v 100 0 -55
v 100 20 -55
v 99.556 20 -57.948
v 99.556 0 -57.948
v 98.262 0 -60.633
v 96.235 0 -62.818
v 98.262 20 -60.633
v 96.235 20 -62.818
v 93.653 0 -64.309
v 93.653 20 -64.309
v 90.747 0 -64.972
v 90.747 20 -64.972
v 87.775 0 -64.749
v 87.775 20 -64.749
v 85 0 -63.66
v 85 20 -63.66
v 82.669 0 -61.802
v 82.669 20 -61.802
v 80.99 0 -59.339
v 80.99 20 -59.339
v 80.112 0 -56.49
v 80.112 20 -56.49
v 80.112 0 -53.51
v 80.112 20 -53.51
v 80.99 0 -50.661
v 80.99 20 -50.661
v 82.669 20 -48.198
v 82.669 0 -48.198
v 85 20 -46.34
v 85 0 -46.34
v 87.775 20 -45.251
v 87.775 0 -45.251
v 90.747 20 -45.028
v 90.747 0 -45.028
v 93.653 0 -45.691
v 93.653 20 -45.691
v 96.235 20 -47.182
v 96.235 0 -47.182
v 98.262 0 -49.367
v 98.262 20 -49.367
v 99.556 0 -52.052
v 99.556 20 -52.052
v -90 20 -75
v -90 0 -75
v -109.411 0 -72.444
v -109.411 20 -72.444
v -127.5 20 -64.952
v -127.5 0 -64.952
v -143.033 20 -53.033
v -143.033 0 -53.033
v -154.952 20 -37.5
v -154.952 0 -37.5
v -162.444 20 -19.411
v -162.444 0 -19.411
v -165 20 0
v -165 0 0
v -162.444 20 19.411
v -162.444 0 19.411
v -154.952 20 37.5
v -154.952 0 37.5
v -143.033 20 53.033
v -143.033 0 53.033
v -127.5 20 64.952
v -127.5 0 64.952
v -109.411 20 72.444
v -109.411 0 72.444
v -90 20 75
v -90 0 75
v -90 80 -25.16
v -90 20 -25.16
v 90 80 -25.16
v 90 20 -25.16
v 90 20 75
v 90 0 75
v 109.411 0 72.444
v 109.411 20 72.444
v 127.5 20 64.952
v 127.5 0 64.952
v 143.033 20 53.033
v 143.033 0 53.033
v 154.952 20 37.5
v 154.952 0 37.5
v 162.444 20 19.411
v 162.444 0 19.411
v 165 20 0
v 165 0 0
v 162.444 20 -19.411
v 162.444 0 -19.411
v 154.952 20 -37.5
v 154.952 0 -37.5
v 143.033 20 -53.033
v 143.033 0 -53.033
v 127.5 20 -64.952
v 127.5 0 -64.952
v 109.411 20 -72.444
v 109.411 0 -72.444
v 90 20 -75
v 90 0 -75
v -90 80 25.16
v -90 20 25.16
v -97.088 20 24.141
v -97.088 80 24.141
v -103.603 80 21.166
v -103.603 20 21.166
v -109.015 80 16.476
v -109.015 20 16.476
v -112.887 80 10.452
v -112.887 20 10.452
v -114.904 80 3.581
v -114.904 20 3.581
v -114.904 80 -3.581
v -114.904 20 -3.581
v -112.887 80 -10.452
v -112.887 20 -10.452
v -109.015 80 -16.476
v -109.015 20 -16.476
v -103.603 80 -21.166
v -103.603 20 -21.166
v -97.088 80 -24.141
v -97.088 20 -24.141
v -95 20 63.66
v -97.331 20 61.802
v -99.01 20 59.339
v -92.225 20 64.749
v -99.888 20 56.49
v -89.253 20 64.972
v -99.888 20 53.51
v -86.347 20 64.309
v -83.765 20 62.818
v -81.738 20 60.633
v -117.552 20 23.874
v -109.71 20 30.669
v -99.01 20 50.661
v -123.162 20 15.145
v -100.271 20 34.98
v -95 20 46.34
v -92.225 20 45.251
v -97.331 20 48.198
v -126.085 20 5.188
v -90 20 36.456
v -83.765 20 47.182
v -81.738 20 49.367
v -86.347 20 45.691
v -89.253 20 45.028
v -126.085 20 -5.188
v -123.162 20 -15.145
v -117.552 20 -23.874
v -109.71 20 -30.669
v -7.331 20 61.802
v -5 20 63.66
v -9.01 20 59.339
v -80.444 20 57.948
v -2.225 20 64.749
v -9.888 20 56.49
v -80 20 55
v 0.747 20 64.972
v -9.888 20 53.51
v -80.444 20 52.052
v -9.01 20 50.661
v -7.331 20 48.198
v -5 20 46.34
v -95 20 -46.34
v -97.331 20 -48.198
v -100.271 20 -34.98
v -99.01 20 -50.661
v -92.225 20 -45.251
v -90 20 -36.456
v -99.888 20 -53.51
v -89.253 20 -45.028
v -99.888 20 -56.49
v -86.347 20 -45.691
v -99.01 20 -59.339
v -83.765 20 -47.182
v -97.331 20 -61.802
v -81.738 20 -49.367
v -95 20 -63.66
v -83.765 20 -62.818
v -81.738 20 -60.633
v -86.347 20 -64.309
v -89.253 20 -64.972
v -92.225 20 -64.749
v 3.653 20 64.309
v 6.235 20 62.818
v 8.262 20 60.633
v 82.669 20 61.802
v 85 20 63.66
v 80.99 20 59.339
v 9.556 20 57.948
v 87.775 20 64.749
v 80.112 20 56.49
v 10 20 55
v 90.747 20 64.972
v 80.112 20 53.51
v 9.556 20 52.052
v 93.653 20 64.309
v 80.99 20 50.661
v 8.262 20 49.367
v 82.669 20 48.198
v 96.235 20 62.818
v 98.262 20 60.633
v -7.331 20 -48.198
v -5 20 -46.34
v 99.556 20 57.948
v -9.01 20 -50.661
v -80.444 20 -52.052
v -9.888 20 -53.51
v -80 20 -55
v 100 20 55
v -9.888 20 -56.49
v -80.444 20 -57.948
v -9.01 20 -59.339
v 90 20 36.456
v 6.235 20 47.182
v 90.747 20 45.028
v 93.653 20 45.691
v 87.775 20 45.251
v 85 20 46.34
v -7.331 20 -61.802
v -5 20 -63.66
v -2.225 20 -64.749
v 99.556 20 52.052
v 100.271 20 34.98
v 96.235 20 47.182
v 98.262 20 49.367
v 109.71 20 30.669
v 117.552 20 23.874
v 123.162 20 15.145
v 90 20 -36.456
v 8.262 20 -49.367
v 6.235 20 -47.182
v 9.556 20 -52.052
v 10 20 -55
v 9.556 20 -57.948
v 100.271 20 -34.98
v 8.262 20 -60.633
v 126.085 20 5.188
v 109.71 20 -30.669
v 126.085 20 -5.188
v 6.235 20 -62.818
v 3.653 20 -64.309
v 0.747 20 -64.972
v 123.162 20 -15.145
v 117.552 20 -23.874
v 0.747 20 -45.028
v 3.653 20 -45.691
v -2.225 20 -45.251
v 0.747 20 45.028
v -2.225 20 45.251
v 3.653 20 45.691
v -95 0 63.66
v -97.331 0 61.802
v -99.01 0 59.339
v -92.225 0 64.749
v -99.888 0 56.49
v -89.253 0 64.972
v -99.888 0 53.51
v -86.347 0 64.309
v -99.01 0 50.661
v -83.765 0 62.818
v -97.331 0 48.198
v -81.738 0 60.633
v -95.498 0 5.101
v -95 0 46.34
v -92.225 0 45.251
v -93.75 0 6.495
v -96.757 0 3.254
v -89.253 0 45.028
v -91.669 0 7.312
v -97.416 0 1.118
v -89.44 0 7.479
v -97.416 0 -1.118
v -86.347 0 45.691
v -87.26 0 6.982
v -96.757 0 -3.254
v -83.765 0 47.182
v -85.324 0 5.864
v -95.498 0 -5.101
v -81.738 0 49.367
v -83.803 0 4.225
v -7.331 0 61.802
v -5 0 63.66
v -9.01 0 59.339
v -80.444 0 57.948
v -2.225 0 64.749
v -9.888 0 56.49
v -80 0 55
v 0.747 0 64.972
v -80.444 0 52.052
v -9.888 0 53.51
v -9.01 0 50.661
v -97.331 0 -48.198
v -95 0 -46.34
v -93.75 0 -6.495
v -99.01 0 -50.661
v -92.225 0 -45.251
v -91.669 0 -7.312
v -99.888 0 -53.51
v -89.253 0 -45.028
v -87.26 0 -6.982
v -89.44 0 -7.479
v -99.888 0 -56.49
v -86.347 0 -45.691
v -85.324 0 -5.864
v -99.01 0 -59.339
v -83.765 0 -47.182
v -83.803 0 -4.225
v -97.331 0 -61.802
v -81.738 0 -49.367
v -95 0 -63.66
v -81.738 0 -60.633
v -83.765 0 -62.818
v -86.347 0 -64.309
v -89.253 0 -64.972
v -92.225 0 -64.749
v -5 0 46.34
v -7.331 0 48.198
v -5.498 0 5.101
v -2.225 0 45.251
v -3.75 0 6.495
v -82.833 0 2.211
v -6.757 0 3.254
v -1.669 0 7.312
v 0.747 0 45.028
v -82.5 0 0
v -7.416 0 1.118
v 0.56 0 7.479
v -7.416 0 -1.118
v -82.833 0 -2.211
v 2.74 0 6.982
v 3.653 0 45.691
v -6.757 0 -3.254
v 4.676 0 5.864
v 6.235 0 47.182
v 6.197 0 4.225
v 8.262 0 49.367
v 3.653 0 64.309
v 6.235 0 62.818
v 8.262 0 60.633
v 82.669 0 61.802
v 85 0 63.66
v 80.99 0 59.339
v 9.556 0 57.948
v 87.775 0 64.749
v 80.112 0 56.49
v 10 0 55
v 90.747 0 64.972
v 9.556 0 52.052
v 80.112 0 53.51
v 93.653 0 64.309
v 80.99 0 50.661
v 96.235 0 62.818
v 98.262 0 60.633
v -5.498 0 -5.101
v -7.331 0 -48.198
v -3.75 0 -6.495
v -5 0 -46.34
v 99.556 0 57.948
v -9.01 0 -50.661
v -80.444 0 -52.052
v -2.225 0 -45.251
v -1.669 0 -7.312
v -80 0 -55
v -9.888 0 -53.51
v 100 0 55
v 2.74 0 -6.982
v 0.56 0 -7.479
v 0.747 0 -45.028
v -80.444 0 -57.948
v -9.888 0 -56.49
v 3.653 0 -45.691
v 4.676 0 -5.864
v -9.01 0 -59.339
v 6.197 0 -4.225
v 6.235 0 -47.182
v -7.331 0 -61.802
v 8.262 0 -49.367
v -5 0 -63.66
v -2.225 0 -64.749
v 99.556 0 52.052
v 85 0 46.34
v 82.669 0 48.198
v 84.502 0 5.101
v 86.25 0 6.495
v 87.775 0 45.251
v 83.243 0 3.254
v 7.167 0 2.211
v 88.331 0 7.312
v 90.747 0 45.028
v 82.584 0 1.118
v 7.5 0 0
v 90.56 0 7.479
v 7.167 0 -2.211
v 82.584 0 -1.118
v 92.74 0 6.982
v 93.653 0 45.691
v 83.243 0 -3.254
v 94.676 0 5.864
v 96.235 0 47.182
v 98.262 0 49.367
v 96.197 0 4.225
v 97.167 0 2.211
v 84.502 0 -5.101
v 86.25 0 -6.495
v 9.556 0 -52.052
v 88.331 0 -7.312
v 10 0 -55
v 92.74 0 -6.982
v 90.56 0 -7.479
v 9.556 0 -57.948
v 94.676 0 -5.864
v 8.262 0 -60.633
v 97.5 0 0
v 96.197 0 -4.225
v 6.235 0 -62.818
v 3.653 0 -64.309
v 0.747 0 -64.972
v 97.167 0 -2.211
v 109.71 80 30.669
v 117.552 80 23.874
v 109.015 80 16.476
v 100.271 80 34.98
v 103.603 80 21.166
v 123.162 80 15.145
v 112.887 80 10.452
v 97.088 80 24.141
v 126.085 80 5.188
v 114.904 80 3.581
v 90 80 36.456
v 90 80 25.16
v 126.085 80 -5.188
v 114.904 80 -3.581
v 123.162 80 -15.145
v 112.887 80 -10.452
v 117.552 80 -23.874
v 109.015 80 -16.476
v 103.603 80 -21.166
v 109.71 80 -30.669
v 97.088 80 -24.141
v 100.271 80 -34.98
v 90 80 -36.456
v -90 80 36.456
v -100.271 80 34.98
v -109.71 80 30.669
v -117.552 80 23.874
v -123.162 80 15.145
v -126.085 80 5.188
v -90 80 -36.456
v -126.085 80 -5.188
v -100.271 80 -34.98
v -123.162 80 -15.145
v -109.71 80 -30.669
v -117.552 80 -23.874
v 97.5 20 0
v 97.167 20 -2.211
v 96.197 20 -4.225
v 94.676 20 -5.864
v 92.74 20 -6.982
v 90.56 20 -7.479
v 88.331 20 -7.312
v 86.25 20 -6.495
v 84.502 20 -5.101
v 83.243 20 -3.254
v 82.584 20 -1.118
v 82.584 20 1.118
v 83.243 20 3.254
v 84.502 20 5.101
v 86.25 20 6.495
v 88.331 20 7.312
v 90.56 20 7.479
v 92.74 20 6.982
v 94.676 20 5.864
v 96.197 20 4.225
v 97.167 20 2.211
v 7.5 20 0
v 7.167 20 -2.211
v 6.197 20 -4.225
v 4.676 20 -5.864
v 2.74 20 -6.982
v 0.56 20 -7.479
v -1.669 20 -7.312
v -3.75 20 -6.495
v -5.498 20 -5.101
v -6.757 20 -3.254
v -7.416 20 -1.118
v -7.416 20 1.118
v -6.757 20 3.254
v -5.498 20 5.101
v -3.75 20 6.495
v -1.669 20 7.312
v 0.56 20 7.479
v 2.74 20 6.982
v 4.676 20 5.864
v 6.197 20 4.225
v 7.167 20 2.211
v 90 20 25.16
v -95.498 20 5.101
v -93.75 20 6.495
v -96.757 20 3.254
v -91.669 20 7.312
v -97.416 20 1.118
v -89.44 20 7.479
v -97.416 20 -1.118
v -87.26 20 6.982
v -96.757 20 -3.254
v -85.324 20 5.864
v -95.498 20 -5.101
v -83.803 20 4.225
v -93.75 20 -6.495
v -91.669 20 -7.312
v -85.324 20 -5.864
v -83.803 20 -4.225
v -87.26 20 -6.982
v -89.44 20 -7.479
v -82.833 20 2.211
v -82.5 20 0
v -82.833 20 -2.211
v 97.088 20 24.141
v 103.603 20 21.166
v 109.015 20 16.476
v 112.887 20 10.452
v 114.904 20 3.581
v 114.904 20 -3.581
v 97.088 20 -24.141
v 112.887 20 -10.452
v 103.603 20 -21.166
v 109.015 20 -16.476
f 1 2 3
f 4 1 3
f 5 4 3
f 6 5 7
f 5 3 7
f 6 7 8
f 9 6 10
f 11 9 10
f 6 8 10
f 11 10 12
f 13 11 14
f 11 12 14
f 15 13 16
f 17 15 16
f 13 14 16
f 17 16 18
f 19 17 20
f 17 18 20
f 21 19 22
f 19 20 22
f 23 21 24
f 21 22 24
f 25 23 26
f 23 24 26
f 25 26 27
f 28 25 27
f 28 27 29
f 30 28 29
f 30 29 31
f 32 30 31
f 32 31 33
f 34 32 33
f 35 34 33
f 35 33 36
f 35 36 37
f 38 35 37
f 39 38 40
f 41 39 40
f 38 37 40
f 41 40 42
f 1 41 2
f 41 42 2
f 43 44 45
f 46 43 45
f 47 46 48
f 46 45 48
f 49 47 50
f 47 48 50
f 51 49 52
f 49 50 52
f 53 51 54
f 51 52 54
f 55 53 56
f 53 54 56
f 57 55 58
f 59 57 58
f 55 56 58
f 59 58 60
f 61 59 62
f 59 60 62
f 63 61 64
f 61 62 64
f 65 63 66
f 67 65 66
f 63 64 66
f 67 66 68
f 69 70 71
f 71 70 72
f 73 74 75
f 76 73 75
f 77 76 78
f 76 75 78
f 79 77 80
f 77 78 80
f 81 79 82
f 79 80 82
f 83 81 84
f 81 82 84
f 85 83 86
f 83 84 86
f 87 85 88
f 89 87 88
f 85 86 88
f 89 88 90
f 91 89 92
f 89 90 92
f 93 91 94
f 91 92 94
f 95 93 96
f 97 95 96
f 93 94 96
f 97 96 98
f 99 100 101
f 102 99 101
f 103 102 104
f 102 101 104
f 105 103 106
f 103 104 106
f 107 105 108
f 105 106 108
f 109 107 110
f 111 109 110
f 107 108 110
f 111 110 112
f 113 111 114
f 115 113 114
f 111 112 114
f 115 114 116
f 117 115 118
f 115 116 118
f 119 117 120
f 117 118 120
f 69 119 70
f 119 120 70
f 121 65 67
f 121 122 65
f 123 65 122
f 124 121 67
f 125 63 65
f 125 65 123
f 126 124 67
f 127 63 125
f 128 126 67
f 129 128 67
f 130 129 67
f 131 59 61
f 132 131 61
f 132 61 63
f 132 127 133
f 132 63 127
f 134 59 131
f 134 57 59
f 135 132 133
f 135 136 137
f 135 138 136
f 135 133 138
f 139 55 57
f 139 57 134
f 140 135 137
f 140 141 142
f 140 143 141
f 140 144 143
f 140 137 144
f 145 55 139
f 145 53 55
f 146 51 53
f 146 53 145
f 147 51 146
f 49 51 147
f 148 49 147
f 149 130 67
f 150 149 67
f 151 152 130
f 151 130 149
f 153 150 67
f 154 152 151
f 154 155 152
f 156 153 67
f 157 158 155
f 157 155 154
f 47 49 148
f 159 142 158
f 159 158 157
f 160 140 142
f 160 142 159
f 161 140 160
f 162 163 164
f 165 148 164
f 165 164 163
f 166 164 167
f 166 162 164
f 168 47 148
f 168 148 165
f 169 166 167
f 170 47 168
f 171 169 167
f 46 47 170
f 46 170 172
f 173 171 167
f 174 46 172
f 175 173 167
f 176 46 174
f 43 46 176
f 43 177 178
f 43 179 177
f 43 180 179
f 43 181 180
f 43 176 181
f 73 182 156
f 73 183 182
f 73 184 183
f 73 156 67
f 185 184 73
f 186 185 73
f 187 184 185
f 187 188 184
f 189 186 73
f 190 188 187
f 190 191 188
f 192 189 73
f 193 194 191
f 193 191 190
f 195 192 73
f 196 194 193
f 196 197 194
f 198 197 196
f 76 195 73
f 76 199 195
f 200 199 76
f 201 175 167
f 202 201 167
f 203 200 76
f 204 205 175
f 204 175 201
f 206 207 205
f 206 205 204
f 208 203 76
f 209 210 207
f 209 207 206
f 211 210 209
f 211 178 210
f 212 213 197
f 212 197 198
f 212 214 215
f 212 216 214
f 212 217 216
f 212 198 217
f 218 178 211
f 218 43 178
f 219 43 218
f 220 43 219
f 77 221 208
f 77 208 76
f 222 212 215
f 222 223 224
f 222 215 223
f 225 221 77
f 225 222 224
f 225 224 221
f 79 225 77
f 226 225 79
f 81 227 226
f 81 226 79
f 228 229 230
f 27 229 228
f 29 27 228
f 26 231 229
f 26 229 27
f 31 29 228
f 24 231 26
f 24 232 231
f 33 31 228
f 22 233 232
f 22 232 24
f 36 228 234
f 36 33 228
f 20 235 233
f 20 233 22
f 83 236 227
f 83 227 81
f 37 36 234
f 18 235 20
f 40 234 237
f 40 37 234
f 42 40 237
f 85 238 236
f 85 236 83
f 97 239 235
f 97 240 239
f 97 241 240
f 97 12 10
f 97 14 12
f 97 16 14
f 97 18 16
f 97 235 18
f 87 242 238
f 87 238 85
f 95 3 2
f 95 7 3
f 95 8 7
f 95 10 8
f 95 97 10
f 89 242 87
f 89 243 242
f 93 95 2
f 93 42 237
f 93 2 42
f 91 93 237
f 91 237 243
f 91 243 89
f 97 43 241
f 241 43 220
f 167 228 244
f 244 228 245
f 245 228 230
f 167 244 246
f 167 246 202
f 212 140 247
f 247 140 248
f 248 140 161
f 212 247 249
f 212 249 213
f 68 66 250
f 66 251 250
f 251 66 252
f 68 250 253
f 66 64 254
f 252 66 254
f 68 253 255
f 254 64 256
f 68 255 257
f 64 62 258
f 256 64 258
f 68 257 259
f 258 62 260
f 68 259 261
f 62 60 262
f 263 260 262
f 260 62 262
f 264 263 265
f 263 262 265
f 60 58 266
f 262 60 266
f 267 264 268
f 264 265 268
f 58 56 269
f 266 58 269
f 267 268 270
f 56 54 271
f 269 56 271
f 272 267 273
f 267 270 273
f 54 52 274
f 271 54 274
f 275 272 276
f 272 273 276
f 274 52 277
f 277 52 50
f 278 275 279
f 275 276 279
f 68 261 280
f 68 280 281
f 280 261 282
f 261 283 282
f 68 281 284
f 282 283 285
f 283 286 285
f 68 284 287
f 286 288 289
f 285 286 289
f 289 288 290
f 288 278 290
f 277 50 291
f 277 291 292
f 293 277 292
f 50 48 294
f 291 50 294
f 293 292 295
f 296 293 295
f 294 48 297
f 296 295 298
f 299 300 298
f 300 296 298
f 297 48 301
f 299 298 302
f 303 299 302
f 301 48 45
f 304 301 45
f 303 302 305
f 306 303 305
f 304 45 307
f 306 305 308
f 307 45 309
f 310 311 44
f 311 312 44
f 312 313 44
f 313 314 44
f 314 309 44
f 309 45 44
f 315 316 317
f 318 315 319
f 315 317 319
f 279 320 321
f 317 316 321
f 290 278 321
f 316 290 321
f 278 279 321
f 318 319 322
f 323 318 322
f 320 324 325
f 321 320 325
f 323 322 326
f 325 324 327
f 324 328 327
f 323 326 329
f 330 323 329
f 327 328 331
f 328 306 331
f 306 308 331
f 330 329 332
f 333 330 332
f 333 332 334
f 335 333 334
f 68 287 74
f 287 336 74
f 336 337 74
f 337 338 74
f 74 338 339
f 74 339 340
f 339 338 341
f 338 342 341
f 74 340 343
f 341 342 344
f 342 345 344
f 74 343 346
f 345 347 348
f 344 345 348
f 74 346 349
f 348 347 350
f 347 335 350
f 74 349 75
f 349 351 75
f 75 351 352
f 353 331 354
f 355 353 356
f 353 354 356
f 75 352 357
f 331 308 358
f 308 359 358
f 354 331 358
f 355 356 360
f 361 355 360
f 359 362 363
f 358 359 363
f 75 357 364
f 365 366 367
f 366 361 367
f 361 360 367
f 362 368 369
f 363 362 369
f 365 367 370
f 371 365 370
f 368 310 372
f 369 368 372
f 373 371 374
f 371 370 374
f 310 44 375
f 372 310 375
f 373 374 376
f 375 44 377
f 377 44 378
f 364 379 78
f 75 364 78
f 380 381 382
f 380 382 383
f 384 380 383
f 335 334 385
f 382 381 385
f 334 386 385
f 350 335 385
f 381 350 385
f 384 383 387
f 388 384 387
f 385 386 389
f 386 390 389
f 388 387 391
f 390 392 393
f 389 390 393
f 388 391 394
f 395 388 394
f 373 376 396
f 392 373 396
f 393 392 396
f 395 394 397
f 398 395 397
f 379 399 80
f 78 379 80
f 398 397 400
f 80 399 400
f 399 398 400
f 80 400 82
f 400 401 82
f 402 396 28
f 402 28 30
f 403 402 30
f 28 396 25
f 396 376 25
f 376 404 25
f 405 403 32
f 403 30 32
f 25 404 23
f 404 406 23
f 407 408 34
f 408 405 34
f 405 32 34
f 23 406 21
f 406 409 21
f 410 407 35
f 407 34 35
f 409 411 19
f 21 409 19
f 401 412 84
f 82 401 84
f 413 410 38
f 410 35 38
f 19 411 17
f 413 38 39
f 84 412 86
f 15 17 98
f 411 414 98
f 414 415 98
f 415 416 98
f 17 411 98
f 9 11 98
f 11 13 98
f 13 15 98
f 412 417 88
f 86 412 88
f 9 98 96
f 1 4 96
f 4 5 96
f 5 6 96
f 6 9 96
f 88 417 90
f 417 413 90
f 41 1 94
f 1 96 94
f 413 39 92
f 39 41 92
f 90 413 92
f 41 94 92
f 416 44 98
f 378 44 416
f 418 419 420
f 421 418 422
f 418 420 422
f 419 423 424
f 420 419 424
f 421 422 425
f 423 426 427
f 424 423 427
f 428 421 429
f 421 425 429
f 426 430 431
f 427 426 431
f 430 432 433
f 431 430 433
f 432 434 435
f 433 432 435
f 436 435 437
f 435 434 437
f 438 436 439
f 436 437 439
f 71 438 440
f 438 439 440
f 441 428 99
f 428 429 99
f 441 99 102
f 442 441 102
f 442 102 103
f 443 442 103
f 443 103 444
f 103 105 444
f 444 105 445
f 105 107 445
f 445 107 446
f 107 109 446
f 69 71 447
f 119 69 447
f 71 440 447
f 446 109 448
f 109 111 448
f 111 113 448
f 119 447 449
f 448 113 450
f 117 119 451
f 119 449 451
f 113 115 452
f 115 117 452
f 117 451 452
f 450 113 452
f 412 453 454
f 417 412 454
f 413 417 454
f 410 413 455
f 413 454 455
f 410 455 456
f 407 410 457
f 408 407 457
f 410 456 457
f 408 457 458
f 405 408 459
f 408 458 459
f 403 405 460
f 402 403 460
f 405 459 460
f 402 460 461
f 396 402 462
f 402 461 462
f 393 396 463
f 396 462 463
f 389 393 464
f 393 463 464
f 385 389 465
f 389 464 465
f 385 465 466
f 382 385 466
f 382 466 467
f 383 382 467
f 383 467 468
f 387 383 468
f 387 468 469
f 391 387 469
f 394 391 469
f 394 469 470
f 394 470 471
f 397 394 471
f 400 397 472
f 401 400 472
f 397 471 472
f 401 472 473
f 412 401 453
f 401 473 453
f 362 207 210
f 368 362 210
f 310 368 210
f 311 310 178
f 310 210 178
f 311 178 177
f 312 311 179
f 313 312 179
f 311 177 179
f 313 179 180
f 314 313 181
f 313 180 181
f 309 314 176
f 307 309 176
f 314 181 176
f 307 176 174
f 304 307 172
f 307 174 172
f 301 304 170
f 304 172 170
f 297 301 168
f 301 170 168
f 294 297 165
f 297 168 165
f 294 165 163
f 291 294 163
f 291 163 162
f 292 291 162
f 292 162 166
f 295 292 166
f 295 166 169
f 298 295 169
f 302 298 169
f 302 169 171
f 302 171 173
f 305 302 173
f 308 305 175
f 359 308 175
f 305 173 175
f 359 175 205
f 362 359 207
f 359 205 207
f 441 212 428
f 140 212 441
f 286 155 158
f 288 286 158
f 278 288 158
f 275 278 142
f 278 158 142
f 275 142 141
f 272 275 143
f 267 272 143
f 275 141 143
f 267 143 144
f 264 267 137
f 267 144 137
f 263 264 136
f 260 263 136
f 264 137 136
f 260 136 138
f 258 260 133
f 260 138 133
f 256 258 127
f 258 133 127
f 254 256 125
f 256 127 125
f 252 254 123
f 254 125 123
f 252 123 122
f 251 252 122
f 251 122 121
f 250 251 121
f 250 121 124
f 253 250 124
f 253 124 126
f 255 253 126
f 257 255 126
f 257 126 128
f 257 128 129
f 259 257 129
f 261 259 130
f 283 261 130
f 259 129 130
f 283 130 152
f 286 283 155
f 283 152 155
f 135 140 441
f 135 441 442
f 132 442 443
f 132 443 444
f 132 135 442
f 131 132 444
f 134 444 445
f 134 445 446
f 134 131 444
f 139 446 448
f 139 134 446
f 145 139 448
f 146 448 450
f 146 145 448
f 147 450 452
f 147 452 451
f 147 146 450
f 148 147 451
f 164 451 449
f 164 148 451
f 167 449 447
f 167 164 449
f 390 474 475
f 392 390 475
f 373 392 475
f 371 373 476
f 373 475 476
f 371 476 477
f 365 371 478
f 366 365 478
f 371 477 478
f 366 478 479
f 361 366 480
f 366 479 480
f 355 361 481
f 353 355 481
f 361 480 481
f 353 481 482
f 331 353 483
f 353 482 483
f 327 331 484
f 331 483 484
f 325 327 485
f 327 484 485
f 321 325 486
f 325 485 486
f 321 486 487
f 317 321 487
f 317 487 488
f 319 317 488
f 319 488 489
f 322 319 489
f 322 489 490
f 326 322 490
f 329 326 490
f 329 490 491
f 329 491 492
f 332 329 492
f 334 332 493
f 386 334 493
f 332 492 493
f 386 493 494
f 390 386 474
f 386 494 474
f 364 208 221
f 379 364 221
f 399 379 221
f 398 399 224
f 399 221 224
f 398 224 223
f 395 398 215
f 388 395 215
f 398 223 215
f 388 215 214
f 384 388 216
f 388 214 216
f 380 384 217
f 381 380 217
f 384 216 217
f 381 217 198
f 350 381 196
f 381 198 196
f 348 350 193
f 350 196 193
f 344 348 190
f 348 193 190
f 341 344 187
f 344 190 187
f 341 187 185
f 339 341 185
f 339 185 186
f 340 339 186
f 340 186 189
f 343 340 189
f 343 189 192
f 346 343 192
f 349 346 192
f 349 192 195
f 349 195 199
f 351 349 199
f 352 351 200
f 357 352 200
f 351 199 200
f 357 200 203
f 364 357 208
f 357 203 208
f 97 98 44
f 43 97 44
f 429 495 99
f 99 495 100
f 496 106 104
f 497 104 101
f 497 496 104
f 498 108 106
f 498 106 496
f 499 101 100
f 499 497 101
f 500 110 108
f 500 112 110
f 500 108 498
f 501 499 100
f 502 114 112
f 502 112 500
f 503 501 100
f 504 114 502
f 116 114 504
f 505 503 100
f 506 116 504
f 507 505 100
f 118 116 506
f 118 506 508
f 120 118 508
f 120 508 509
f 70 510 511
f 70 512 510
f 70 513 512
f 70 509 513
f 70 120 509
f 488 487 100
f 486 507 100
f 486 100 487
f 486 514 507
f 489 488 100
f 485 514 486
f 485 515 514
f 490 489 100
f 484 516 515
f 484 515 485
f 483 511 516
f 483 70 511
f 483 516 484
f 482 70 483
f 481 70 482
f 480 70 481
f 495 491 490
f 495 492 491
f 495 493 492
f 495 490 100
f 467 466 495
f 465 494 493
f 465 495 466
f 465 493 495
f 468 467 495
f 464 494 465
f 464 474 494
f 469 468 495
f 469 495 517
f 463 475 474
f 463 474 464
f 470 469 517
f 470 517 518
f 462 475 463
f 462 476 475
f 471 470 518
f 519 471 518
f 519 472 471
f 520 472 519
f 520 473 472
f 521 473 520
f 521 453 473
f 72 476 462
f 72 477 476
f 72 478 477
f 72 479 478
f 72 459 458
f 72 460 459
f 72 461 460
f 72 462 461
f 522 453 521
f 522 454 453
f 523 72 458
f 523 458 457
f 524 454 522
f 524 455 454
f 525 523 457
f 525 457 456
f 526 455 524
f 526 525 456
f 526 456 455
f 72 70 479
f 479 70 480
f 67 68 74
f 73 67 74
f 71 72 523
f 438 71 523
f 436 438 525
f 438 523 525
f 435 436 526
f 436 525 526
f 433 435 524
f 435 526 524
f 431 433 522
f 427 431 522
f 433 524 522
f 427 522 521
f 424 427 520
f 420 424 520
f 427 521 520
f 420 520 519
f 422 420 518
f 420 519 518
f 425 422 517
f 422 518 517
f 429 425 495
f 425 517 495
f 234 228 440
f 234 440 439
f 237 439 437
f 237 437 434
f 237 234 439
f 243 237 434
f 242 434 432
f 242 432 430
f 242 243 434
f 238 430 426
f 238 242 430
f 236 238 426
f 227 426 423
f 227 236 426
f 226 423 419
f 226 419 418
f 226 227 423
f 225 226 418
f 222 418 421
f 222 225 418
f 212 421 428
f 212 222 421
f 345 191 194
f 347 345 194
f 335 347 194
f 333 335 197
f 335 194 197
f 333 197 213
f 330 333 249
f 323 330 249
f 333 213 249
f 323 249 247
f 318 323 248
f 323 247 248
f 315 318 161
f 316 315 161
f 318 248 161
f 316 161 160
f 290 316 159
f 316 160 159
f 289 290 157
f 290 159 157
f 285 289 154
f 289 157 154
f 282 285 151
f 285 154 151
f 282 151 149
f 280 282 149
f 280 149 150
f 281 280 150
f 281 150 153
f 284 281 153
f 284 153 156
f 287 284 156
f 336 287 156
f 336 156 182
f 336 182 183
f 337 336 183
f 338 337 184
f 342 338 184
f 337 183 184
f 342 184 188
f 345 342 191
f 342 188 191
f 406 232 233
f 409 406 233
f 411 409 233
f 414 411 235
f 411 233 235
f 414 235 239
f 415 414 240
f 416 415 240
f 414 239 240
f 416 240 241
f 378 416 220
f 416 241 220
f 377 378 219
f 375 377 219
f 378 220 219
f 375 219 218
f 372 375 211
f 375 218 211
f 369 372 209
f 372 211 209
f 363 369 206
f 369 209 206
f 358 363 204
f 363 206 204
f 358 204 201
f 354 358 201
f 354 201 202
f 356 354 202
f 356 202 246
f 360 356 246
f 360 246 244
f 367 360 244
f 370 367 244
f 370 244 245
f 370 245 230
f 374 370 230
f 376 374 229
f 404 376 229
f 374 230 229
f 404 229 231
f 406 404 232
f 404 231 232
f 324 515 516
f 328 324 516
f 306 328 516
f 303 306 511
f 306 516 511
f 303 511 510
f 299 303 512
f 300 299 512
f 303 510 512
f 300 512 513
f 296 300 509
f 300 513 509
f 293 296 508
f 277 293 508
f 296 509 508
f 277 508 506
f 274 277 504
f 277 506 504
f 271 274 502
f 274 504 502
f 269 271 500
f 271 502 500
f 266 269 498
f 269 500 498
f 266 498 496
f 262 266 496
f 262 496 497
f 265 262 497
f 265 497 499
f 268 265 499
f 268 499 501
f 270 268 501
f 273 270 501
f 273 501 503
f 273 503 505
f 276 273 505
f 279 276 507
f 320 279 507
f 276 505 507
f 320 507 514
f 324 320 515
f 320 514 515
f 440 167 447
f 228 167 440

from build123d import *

# Parameters (mm, degrees)
BOSS_EXTRUDE1_DEPTH = 20
SKETCH2_R           = 10
CUT_EXTRUDE1_DEPTH  = 20
LPATTERN1_COUNT     = 3
LPATTERN1_PITCH     = 90
SKETCH4_R           = 10
CUT_EXTRUDE2_DEPTH  = 20
LPATTERN2_COUNT     = 3
LPATTERN2_PITCH     = 90
SKETCH5_R           = 7.5
CUT_EXTRUDE4_DEPTH  = 20
LPATTERN4_COUNT     = 3
LPATTERN4_PITCH     = 90
BOSS_EXTRUDE3_DEPTH = 60


with BuildPart() as part:
    # Sketch1 → Boss-Extrude1 (new body)
    with BuildSketch(Plane(origin=(0, 0, 0), x_dir=(1, 0, 0), z_dir=(0, 1, 0))):
        with BuildLine():
            Line((-90, -75), (90, -75))
            ThreePointArc((90, -75), (165, 0), (90, 75))
            Line((90, 75), (-90, 75))
            ThreePointArc((-90, 75), (-165, 0), (-90, -75))
        make_face()
    extrude(amount=BOSS_EXTRUDE1_DEPTH)

    # Sketch2 → Cut-Extrude1 (cut)
    with BuildSketch(Plane(origin=(0, 20, 0), x_dir=(1, 0, 0), z_dir=(0, 1, 0))):
        with Locations((-90, 55)):
            Circle(SKETCH2_R)
    cut_extrude1 = extrude(amount=-CUT_EXTRUDE1_DEPTH, mode=Mode.SUBTRACT)

    # LPattern1: Cut-Extrude1 ×3
    with Locations(*[(i * LPATTERN1_PITCH, 0, 0) for i in range(1, LPATTERN1_COUNT)]):
        add(cut_extrude1, mode=Mode.SUBTRACT)

    # Sketch4 → Cut-Extrude2 (cut)
    with BuildSketch(Plane(origin=(0, 20, 0), x_dir=(1, 0, 0), z_dir=(0, 1, 0))):
        with Locations((-90, -55)):
            Circle(SKETCH4_R)
    cut_extrude2 = extrude(amount=-CUT_EXTRUDE2_DEPTH, mode=Mode.SUBTRACT)

    # LPattern2: Cut-Extrude2 ×3
    with Locations(*[(i * LPATTERN2_PITCH, 0, 0) for i in range(1, LPATTERN2_COUNT)]):
        add(cut_extrude2, mode=Mode.SUBTRACT)

    # Sketch5 → Cut-Extrude4 (cut)
    with BuildSketch(Plane(origin=(0, 20, 0), x_dir=(1, 0, 0), z_dir=(0, 1, 0))):
        with Locations((-90, 0)):
            Circle(SKETCH5_R)
    cut_extrude4 = extrude(amount=-CUT_EXTRUDE4_DEPTH, mode=Mode.SUBTRACT)

    # LPattern4: Cut-Extrude4 ×3
    with Locations(*[(i * LPATTERN4_PITCH, 0, 0) for i in range(1, LPATTERN4_COUNT)]):
        add(cut_extrude4, mode=Mode.SUBTRACT)

    # Sketch6 → Boss-Extrude3 (add)
    with BuildSketch(Plane(origin=(0, 20, 0), x_dir=(1, 0, 0), z_dir=(0, 1, 0))):
        with BuildLine():
            Line((-90, 36.456417916), (90, 36.456417916))
            ThreePointArc((90, 36.456417916), (126.456417916, 0), (90, -36.456417916))
            Line((90, -36.456417916), (-90, -36.456417916))
            ThreePointArc((-90, -36.456417916), (-126.456417916, 0), (-90, 36.456417916))
        make_face()
        with BuildLine():
            Line((-90, 25.16029231), (90, 25.16029231))
            ThreePointArc((90, 25.16029231), (115.16029231, 0), (90, -25.16029231))
            Line((90, -25.16029231), (-90, -25.16029231))
            ThreePointArc((-90, -25.16029231), (-115.16029231, 0), (-90, 25.16029231))
        make_face(mode=Mode.SUBTRACT)
    extrude(amount=BOSS_EXTRUDE3_DEPTH)


solid = part.part
